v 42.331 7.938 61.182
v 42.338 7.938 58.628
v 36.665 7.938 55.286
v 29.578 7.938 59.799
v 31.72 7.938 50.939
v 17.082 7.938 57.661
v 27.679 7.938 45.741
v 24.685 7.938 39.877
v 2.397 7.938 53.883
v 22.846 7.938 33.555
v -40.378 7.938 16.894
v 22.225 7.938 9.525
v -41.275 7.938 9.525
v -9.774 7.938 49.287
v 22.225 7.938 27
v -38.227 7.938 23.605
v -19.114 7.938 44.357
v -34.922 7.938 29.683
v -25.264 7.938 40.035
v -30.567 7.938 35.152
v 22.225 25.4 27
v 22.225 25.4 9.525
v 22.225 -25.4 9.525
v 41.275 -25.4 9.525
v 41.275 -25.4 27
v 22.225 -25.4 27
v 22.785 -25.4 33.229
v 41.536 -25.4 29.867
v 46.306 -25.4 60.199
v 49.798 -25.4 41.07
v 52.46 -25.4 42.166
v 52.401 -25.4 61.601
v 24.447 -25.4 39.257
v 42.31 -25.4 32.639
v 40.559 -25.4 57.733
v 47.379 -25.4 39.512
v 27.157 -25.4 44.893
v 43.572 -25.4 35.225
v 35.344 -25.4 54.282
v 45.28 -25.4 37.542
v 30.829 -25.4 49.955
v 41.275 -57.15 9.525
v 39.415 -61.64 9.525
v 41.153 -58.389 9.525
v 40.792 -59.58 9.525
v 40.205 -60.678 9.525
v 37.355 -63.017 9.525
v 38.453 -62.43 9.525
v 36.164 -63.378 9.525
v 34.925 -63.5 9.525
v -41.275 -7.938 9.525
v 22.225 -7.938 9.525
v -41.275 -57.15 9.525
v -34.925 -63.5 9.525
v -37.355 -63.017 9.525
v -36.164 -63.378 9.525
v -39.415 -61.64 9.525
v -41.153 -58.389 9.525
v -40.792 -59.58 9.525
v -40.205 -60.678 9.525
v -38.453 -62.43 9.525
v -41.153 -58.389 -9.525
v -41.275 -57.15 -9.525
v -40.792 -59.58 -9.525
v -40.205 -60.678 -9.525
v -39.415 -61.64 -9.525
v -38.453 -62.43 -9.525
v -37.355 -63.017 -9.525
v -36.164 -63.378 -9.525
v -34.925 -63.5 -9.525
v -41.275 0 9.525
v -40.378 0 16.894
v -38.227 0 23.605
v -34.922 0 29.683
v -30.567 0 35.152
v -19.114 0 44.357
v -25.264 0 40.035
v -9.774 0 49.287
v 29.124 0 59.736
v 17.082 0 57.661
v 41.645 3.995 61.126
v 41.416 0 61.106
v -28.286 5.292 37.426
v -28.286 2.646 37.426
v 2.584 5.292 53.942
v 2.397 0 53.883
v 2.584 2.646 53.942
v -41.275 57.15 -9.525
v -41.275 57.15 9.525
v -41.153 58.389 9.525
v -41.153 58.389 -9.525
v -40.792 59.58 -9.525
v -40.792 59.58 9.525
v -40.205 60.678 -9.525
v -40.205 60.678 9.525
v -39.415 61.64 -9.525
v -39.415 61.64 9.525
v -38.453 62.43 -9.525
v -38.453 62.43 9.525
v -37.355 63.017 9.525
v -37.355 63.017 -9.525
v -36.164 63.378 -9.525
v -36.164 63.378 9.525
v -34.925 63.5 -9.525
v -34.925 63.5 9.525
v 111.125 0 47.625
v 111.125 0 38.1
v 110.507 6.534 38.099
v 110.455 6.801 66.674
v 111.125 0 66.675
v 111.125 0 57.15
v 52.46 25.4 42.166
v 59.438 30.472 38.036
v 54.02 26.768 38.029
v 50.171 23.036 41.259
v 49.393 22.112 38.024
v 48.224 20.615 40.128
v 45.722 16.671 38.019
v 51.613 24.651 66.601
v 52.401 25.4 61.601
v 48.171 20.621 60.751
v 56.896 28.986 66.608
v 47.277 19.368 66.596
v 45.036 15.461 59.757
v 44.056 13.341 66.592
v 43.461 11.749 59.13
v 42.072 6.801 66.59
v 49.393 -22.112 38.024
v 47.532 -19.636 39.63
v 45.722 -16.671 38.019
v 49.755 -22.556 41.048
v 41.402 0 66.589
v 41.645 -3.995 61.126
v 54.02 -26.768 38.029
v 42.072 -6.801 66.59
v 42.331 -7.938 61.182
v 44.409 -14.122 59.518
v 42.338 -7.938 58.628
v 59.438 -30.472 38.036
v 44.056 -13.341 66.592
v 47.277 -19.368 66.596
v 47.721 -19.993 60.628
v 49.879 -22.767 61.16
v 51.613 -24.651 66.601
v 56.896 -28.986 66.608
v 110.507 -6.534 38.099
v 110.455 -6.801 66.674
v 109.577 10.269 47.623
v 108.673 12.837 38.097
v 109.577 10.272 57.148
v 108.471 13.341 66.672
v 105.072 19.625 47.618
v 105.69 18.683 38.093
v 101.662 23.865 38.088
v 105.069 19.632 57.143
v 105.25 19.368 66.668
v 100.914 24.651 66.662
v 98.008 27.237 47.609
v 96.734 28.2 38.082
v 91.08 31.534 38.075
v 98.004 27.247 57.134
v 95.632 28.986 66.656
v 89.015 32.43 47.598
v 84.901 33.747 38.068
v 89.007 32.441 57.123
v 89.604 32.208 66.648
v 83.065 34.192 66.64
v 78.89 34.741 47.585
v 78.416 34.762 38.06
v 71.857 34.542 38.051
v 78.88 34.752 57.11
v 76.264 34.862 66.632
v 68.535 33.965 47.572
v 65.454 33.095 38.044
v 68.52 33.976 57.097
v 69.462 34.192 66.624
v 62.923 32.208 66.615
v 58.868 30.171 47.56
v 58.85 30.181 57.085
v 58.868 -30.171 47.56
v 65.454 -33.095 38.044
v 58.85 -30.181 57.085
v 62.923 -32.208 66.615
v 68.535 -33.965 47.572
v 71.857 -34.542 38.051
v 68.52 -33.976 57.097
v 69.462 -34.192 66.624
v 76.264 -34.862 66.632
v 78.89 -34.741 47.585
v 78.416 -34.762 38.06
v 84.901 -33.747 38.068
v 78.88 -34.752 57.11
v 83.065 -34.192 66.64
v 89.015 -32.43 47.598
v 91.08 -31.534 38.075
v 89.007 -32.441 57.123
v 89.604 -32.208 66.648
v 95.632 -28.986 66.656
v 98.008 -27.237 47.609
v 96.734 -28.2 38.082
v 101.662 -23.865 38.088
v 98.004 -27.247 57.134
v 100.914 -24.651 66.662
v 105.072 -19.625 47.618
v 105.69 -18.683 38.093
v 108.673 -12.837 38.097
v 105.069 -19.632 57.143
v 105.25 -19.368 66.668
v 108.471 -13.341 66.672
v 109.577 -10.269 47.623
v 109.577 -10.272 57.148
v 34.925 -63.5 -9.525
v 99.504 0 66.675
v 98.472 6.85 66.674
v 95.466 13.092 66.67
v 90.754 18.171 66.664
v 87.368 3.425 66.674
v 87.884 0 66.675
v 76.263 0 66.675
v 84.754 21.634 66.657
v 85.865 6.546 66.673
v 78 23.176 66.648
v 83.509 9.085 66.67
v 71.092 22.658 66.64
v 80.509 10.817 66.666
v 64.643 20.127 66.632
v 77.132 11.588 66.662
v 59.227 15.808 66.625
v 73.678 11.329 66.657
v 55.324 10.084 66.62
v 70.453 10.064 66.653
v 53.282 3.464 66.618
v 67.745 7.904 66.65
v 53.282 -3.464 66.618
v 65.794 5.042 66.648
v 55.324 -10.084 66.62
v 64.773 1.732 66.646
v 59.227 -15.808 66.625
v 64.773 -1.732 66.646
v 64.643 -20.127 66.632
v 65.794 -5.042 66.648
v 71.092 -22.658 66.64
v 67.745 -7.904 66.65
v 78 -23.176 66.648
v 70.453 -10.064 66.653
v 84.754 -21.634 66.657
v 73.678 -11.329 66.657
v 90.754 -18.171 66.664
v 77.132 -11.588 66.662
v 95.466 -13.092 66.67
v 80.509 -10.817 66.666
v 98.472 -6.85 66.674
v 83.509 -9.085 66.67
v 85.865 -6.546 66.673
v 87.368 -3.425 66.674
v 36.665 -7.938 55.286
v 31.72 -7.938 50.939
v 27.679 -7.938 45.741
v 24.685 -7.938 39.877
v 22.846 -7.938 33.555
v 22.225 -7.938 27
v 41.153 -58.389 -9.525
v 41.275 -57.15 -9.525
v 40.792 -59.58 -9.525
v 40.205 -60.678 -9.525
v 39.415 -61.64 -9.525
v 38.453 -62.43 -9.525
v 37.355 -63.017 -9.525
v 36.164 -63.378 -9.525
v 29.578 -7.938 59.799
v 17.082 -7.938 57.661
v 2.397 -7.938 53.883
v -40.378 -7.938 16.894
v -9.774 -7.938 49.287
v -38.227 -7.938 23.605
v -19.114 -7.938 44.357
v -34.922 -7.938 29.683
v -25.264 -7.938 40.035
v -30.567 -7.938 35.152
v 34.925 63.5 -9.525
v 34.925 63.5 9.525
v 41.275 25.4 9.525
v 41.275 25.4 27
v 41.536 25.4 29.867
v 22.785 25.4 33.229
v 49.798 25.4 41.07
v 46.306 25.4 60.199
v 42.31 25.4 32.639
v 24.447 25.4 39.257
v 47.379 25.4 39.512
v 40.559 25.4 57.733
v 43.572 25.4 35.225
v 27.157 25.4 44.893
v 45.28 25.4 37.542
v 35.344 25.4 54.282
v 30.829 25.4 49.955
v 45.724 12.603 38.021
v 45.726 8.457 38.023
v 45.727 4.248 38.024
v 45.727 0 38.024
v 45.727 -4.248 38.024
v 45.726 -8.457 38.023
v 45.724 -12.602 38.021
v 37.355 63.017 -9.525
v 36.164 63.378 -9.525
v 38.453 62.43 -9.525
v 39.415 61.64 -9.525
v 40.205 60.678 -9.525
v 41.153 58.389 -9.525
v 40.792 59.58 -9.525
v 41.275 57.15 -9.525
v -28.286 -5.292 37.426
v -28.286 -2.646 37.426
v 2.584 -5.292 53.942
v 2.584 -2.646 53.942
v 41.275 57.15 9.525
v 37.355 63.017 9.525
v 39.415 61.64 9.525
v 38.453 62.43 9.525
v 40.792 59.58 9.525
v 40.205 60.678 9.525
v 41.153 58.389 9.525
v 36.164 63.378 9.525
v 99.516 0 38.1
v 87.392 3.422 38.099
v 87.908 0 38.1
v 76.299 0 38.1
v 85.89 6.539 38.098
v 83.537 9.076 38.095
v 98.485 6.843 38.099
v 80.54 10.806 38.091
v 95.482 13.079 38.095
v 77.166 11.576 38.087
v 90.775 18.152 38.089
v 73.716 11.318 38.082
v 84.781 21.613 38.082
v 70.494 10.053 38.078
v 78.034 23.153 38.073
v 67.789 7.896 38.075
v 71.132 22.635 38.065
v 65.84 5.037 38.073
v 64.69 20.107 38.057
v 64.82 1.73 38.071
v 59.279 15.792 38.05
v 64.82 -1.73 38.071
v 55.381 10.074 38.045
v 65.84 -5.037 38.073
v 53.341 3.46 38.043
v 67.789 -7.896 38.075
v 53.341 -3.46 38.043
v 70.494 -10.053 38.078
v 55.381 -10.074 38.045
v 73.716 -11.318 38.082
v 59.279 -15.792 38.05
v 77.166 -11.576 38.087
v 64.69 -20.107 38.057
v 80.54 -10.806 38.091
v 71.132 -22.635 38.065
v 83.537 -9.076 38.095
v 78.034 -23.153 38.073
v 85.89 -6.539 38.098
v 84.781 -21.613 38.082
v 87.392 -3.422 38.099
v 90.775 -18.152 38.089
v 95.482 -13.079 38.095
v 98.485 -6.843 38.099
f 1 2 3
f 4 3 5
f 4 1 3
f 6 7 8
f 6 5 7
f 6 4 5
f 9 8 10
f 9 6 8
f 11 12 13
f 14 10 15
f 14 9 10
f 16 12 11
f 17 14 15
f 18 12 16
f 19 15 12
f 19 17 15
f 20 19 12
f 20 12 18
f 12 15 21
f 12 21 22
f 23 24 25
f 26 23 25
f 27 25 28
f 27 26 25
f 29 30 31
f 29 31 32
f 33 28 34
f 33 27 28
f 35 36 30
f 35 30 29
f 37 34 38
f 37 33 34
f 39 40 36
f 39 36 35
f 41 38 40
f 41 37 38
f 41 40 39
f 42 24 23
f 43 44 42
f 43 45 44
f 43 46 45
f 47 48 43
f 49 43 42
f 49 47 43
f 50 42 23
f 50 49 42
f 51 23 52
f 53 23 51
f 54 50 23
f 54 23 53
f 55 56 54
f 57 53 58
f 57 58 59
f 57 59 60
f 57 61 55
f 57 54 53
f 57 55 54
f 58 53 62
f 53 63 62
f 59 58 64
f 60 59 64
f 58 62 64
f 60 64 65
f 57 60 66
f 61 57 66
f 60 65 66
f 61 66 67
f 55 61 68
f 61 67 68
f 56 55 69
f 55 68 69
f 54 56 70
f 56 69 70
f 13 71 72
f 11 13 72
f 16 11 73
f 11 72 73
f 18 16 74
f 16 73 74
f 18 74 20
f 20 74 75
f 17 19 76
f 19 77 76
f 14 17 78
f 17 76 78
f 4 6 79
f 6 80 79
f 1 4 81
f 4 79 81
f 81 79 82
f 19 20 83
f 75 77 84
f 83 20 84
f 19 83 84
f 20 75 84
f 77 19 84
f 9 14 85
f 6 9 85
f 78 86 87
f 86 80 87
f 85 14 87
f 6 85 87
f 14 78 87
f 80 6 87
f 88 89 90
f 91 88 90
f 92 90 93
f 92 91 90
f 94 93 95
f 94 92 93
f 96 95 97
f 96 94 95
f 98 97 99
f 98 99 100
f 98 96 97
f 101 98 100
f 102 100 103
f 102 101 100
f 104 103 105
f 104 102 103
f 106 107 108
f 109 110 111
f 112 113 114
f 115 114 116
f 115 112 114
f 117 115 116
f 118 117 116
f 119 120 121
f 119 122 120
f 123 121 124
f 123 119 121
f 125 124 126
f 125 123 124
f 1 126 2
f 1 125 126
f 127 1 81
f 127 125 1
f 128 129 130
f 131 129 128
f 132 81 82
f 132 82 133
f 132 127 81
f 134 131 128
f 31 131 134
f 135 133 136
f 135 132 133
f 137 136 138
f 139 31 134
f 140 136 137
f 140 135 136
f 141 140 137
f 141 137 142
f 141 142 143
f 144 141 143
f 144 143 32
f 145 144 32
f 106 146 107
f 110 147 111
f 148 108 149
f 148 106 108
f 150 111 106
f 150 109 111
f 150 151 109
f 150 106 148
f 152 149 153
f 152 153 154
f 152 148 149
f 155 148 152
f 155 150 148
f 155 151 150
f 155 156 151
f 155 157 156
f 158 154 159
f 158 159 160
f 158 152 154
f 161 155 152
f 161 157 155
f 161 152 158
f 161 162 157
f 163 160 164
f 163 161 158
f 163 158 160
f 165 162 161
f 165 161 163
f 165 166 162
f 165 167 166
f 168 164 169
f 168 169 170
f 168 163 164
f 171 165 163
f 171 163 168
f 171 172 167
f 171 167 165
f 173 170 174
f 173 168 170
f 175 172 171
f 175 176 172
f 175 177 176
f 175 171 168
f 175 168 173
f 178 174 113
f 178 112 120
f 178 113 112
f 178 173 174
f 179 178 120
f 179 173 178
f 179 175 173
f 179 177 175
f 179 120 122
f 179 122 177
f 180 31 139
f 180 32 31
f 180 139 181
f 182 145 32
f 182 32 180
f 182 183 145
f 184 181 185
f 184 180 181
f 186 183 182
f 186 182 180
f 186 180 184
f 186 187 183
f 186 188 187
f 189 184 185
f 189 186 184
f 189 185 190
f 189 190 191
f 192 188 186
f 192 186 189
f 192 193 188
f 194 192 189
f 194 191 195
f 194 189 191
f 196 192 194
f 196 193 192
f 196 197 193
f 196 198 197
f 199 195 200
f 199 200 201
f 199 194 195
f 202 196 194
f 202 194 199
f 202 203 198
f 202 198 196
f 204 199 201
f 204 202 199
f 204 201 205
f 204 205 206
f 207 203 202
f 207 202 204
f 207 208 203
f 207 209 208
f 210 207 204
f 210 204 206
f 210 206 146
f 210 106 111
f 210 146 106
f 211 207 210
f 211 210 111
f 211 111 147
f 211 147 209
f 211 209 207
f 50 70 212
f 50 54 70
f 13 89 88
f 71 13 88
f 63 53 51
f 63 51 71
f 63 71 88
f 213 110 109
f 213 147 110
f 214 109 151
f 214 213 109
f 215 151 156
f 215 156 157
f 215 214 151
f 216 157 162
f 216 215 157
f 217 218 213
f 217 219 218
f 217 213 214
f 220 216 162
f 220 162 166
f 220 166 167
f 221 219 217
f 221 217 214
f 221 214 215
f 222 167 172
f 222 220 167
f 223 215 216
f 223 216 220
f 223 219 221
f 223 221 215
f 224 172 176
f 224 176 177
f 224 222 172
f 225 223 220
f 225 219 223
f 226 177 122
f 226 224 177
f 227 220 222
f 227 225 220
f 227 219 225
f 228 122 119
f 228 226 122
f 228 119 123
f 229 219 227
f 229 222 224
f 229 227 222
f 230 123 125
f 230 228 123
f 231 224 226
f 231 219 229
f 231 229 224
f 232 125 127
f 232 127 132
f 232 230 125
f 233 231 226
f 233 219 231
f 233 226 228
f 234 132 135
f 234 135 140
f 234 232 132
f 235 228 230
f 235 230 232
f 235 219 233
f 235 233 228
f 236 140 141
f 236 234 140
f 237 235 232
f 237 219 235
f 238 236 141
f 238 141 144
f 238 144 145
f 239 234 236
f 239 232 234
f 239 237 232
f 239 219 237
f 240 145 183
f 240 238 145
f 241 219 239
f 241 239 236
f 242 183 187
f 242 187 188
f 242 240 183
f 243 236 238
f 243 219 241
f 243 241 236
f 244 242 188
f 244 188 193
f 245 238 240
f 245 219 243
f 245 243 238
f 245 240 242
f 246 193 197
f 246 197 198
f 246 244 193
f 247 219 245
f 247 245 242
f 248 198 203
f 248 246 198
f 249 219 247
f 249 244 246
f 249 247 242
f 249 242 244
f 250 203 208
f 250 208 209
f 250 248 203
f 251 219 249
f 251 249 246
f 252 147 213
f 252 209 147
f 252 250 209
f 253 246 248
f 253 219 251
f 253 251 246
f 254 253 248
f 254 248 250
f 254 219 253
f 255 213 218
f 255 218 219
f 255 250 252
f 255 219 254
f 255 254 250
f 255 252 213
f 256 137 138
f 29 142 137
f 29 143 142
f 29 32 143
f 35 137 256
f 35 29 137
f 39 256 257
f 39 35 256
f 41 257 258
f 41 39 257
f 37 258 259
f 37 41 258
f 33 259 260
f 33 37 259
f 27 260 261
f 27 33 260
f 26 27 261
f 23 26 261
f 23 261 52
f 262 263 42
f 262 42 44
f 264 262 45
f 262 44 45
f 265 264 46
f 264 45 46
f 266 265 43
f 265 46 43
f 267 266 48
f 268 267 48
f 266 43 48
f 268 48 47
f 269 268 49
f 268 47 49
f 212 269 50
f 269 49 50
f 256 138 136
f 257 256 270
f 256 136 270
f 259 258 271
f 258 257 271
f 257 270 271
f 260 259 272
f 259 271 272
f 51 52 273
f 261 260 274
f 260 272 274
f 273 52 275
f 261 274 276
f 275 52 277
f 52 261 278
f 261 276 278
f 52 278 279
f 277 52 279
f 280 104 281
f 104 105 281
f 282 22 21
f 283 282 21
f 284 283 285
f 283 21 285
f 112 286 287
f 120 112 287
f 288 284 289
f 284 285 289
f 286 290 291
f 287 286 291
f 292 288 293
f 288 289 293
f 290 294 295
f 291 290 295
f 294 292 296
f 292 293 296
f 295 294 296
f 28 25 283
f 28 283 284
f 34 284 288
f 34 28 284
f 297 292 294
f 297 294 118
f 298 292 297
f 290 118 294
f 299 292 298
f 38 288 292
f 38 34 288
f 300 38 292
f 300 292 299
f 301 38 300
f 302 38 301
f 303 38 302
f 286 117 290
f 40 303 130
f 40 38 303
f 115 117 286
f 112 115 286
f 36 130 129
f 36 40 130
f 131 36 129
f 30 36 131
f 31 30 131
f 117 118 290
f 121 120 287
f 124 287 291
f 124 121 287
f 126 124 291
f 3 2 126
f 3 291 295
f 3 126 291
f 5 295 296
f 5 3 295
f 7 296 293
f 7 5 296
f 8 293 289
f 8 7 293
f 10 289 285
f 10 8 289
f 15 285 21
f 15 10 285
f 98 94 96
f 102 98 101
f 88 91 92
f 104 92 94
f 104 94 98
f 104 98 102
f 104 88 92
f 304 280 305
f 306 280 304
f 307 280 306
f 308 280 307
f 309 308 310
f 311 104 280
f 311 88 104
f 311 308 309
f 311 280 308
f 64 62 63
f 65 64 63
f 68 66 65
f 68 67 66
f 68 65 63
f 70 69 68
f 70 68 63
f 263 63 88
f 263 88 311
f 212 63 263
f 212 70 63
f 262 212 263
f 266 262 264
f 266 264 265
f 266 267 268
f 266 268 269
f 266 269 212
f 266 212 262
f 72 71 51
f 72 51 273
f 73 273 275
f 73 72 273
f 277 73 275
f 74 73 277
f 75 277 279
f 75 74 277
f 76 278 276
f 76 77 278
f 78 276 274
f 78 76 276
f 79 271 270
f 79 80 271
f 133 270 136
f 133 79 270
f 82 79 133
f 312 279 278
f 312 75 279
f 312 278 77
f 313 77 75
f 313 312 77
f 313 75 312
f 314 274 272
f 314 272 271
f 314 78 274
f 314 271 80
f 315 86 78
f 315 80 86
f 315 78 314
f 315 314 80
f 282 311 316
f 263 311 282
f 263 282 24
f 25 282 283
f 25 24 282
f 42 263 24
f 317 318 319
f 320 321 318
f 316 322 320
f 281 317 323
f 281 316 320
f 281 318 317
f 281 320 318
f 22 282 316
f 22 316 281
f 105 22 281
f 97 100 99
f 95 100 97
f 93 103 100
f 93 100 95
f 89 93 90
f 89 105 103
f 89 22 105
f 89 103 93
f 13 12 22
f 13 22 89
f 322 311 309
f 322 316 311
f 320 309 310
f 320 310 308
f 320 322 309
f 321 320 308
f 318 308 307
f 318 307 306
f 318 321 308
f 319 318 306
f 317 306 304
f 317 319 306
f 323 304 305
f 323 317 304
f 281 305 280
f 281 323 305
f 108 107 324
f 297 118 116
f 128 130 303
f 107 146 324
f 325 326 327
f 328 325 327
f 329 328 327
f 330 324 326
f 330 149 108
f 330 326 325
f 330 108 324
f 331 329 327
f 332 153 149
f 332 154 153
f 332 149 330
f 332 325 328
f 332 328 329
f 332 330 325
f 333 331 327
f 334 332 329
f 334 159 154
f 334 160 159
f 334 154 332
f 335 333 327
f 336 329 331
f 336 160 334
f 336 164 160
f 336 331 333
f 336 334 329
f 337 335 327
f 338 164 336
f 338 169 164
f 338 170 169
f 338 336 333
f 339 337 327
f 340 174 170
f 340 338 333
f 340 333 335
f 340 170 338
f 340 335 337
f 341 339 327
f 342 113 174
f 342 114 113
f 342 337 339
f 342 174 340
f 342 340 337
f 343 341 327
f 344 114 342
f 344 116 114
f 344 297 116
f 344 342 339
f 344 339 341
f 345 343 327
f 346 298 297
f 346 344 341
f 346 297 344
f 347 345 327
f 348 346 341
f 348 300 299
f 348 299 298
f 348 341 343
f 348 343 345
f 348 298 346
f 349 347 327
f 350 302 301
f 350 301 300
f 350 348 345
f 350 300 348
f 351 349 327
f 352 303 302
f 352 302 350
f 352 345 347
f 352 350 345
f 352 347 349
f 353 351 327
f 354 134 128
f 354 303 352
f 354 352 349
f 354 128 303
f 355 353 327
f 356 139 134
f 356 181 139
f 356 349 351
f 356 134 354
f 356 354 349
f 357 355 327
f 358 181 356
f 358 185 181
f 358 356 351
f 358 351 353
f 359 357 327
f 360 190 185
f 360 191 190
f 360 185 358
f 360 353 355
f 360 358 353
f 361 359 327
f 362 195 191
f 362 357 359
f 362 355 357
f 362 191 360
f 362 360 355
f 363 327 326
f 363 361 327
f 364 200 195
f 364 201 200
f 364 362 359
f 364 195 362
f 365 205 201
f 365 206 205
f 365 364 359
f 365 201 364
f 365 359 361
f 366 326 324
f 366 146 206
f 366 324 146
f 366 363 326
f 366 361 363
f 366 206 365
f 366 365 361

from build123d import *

# Parameters (mm, degrees)
F1_DEPTH = 63.5
F2_DEPTH = 25.4
F3_DEPTH = 25.4
F4_DEPTH = 7.9375
F6_R     = 6.35


with BuildPart() as f1:
    # F0 (on Front) → F1 (new body, symmetric)
    with BuildSketch(Plane.XZ):
        Polygon((-41.275, 9.525), (-41.275, -9.525), (41.275, -9.525), (41.275, 9.525), (22.2250011172, 9.525), align=None)
    extrude(amount=F1_DEPTH, both=True)

    # F0 (on Front) → F2 (join, symmetric)
    with BuildSketch(Plane.XZ):
        with BuildLine():
            Line((22.2250011172, 9.525), (41.275, 9.525))
            Line((41.275, 9.525), (41.275, 27.0002))
            ThreePointArc((41.275, 27.0002), (45.9246798487, 38.2255201513), (57.15, 42.8752))
            Line((57.15, 42.8752), (60.325, 42.8752))
            Line((60.325, 42.8752), (60.325, 61.9251988828))
            Line((60.325, 61.9251988828), (57.15, 61.9251988828))
            add(Edge.make_bspline(
                [(55.4567430493, 61.8841279306), (56.0220700945, 61.8996898871), (56.5865253234, 61.913371712), (57.15, 61.9251988828)],
                knots=[110.1217614603, 110.1217614603, 110.1217614603, 110.1217614603, 111.5045356385, 111.5045356385, 111.5045356385, 111.5045356385], degree=3))
            ThreePointArc((55.4567430493, 61.8841279306), (31.8627250966, 51.089809273), (22.2250011172, 27.0002))
            Line((22.2250011172, 27.0002), (22.2250011172, 9.525))
        make_face()
    extrude(amount=F2_DEPTH, both=True)

    # F3 (add): a face of the model
    f3_faces = [f1.faces().sort_by_distance(p)[0] for p in [
        (60.325, 0, 52.4001994414),
    ]]
    extrude(f3_faces, amount=F3_DEPTH)

    # F0 (on Front) → F4 (join, symmetric)
    with BuildSketch(Plane.XZ):
        with BuildLine():
            add(Edge.make_bspline(
                [(-41.275, 9.525), (-40.1158891468, 47.4811966341), (10.4350677867, 60.6448004288), (55.4567430493, 61.8841279306)],
                knots=[0, 0, 0, 0, 110.1217614603, 110.1217614603, 110.1217614603, 110.1217614603], degree=3))
            Line((-41.275, 9.525), (22.2250011172, 9.525))
            Line((22.2250011172, 9.525), (22.2250011172, 27.0002))
            ThreePointArc((22.2250011172, 27.0002), (31.8627250966, 51.089809273), (55.4567430493, 61.8841279306))
        make_face()
    extrude(amount=F4_DEPTH, both=True)

    # F0 (on Front) → F5 (revolve)
    with BuildSketch(Plane.XZ):
        Polygon((111.125, 66.675), (76.2634606961, 66.675), (76.2987583876, 38.1), (111.125, 38.1), align=None)
    revolve(axis=Axis((76.2811095418, 0, 52.3875), (-0.0012352639, 0, 0.9999992371)))

    # F6
    f6_edges = [f1.edges().sort_by_distance(p)[0] for p in [
        (-41.275, -63.5, 0),
        (41.275, -63.5, 0),
        (41.275, 63.5, 0),
        (-41.275, 63.5, 0),
    ]]
    fillet(f6_edges, radius=F6_R)


solid = f1.part
